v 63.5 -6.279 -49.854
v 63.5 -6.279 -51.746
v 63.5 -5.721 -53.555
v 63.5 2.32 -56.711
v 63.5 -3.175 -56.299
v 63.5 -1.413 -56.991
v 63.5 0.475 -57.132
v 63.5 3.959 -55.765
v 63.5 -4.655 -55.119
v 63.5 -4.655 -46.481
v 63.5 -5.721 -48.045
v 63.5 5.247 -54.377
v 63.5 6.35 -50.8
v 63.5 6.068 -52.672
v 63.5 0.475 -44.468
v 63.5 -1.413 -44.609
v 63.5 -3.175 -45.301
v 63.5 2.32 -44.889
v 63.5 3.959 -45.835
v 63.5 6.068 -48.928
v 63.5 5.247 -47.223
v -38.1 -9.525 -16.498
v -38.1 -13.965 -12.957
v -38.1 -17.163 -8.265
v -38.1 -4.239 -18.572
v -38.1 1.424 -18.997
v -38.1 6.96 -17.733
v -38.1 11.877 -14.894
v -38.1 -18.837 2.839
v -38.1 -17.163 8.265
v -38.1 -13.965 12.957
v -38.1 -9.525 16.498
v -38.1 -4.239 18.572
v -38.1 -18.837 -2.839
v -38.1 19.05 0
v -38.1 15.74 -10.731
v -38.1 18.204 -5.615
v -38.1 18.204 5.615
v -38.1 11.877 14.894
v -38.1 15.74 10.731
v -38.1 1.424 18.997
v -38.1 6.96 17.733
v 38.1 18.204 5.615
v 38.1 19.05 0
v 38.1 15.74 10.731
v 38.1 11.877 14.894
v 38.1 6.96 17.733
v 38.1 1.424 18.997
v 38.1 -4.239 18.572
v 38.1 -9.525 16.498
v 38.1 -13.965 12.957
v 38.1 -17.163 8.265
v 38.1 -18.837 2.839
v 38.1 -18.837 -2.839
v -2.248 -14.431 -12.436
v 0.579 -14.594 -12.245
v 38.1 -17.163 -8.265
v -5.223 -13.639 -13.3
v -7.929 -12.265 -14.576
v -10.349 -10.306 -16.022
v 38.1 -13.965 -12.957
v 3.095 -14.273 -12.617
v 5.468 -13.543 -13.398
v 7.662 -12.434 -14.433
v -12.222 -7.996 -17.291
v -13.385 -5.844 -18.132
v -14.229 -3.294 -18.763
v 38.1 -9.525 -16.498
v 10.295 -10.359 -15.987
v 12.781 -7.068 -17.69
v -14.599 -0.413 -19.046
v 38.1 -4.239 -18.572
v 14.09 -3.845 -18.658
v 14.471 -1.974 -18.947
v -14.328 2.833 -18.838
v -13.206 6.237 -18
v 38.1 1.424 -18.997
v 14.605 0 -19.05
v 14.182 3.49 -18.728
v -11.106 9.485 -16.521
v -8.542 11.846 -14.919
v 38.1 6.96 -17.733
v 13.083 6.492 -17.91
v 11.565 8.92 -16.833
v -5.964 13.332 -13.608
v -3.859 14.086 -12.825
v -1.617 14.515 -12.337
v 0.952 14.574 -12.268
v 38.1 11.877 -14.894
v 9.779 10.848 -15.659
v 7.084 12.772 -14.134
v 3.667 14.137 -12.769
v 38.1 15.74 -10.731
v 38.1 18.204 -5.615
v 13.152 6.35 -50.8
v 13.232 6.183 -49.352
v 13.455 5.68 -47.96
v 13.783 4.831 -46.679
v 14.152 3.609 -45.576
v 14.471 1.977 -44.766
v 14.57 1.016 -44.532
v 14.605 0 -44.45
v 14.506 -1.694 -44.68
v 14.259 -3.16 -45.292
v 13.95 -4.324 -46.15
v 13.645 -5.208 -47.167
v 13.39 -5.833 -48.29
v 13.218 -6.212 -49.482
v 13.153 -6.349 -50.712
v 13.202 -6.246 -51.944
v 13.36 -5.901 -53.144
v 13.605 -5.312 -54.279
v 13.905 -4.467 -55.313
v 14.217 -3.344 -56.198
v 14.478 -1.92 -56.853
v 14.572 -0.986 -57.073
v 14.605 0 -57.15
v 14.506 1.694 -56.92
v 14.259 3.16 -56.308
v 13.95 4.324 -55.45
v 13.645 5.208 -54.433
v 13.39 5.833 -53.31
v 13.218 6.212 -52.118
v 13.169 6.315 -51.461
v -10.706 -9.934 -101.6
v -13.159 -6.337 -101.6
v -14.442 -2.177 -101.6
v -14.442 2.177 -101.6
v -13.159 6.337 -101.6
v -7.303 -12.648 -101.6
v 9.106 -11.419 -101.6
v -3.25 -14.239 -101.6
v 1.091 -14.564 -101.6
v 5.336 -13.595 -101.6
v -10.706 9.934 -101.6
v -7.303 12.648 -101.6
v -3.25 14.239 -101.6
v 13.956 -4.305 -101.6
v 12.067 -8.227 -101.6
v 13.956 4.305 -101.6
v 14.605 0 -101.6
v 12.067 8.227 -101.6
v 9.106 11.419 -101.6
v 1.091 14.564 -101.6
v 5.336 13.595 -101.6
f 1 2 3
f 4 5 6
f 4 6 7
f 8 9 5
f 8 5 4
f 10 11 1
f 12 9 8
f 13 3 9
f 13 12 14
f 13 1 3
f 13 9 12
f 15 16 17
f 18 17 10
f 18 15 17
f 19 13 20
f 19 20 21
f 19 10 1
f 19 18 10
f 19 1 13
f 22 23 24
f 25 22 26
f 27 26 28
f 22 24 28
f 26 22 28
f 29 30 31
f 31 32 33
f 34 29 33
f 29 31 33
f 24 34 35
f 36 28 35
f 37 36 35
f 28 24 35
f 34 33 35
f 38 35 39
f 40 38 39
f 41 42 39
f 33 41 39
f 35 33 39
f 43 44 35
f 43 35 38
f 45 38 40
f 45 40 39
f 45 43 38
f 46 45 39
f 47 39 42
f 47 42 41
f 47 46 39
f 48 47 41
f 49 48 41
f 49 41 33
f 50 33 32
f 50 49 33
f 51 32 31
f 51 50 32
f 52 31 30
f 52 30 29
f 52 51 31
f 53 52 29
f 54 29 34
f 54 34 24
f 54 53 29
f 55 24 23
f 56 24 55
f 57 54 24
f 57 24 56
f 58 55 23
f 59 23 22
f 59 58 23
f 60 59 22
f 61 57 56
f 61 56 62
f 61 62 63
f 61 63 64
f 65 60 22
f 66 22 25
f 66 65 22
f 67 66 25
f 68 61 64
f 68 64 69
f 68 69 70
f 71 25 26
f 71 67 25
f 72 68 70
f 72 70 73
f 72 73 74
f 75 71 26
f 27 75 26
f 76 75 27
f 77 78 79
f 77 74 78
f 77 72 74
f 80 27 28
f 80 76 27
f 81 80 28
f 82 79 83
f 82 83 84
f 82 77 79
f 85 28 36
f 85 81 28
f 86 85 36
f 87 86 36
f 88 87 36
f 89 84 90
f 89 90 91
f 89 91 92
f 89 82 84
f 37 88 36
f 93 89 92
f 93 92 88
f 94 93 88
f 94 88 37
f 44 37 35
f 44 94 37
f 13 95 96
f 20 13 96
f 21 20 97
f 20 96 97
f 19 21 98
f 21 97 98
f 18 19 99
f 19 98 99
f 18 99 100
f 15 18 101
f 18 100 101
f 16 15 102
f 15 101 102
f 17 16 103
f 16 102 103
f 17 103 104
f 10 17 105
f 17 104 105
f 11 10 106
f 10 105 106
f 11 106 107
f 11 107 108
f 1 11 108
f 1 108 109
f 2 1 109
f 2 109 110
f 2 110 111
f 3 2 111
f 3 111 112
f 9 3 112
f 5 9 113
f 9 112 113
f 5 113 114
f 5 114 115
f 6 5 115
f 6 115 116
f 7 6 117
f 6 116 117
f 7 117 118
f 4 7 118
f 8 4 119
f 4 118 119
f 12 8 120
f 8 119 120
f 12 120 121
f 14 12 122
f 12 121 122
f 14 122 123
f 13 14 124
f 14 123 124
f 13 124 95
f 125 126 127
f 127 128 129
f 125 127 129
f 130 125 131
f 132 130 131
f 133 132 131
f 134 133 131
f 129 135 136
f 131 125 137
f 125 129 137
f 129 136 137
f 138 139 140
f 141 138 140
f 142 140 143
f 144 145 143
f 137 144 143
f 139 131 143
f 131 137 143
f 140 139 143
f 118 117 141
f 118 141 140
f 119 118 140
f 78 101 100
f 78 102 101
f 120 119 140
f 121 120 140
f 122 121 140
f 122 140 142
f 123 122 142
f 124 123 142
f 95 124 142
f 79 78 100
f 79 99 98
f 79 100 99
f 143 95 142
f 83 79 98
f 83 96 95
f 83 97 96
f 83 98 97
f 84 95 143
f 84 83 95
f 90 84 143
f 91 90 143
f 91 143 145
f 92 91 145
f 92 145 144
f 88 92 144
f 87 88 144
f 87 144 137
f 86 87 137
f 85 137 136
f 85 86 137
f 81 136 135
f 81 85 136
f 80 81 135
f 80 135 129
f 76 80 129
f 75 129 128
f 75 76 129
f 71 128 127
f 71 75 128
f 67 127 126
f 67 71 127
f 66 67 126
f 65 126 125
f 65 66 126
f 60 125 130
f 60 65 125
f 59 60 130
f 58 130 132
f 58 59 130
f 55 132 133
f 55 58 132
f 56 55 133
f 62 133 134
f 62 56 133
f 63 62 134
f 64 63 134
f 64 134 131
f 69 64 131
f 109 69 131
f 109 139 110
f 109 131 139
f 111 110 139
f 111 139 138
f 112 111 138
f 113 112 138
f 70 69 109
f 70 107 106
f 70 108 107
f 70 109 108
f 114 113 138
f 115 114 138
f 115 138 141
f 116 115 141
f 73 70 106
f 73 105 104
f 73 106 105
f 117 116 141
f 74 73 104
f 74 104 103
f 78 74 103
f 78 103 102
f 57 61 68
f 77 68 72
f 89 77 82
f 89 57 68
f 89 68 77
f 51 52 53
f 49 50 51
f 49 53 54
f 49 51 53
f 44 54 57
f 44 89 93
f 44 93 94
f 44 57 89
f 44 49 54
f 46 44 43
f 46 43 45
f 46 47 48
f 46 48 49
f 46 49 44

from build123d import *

# Parameters (mm, degrees)
F0_R     = 19.05
F1_DEPTH = 38.1
F2_R     = 14.605
F3_DEPTH = 101.6
F4_R     = 6.35
F5_DEPTH = 63.5


with BuildPart() as f1:
    # F0 (on Right) → F1 (new body, symmetric)
    with BuildSketch(Plane.YZ):
        Circle(F0_R)
    extrude(amount=F1_DEPTH, both=True)

    # F2 (on Top) → F3 (join)
    with BuildSketch(Plane.XY):
        Circle(F2_R)
    extrude(amount=-F3_DEPTH)

    # F4 (on Right) → F5 (join)
    with BuildSketch(Plane.YZ):
        with Locations((0, -50.8)):
            Circle(F4_R)
    extrude(amount=F5_DEPTH)


solid = f1.part
